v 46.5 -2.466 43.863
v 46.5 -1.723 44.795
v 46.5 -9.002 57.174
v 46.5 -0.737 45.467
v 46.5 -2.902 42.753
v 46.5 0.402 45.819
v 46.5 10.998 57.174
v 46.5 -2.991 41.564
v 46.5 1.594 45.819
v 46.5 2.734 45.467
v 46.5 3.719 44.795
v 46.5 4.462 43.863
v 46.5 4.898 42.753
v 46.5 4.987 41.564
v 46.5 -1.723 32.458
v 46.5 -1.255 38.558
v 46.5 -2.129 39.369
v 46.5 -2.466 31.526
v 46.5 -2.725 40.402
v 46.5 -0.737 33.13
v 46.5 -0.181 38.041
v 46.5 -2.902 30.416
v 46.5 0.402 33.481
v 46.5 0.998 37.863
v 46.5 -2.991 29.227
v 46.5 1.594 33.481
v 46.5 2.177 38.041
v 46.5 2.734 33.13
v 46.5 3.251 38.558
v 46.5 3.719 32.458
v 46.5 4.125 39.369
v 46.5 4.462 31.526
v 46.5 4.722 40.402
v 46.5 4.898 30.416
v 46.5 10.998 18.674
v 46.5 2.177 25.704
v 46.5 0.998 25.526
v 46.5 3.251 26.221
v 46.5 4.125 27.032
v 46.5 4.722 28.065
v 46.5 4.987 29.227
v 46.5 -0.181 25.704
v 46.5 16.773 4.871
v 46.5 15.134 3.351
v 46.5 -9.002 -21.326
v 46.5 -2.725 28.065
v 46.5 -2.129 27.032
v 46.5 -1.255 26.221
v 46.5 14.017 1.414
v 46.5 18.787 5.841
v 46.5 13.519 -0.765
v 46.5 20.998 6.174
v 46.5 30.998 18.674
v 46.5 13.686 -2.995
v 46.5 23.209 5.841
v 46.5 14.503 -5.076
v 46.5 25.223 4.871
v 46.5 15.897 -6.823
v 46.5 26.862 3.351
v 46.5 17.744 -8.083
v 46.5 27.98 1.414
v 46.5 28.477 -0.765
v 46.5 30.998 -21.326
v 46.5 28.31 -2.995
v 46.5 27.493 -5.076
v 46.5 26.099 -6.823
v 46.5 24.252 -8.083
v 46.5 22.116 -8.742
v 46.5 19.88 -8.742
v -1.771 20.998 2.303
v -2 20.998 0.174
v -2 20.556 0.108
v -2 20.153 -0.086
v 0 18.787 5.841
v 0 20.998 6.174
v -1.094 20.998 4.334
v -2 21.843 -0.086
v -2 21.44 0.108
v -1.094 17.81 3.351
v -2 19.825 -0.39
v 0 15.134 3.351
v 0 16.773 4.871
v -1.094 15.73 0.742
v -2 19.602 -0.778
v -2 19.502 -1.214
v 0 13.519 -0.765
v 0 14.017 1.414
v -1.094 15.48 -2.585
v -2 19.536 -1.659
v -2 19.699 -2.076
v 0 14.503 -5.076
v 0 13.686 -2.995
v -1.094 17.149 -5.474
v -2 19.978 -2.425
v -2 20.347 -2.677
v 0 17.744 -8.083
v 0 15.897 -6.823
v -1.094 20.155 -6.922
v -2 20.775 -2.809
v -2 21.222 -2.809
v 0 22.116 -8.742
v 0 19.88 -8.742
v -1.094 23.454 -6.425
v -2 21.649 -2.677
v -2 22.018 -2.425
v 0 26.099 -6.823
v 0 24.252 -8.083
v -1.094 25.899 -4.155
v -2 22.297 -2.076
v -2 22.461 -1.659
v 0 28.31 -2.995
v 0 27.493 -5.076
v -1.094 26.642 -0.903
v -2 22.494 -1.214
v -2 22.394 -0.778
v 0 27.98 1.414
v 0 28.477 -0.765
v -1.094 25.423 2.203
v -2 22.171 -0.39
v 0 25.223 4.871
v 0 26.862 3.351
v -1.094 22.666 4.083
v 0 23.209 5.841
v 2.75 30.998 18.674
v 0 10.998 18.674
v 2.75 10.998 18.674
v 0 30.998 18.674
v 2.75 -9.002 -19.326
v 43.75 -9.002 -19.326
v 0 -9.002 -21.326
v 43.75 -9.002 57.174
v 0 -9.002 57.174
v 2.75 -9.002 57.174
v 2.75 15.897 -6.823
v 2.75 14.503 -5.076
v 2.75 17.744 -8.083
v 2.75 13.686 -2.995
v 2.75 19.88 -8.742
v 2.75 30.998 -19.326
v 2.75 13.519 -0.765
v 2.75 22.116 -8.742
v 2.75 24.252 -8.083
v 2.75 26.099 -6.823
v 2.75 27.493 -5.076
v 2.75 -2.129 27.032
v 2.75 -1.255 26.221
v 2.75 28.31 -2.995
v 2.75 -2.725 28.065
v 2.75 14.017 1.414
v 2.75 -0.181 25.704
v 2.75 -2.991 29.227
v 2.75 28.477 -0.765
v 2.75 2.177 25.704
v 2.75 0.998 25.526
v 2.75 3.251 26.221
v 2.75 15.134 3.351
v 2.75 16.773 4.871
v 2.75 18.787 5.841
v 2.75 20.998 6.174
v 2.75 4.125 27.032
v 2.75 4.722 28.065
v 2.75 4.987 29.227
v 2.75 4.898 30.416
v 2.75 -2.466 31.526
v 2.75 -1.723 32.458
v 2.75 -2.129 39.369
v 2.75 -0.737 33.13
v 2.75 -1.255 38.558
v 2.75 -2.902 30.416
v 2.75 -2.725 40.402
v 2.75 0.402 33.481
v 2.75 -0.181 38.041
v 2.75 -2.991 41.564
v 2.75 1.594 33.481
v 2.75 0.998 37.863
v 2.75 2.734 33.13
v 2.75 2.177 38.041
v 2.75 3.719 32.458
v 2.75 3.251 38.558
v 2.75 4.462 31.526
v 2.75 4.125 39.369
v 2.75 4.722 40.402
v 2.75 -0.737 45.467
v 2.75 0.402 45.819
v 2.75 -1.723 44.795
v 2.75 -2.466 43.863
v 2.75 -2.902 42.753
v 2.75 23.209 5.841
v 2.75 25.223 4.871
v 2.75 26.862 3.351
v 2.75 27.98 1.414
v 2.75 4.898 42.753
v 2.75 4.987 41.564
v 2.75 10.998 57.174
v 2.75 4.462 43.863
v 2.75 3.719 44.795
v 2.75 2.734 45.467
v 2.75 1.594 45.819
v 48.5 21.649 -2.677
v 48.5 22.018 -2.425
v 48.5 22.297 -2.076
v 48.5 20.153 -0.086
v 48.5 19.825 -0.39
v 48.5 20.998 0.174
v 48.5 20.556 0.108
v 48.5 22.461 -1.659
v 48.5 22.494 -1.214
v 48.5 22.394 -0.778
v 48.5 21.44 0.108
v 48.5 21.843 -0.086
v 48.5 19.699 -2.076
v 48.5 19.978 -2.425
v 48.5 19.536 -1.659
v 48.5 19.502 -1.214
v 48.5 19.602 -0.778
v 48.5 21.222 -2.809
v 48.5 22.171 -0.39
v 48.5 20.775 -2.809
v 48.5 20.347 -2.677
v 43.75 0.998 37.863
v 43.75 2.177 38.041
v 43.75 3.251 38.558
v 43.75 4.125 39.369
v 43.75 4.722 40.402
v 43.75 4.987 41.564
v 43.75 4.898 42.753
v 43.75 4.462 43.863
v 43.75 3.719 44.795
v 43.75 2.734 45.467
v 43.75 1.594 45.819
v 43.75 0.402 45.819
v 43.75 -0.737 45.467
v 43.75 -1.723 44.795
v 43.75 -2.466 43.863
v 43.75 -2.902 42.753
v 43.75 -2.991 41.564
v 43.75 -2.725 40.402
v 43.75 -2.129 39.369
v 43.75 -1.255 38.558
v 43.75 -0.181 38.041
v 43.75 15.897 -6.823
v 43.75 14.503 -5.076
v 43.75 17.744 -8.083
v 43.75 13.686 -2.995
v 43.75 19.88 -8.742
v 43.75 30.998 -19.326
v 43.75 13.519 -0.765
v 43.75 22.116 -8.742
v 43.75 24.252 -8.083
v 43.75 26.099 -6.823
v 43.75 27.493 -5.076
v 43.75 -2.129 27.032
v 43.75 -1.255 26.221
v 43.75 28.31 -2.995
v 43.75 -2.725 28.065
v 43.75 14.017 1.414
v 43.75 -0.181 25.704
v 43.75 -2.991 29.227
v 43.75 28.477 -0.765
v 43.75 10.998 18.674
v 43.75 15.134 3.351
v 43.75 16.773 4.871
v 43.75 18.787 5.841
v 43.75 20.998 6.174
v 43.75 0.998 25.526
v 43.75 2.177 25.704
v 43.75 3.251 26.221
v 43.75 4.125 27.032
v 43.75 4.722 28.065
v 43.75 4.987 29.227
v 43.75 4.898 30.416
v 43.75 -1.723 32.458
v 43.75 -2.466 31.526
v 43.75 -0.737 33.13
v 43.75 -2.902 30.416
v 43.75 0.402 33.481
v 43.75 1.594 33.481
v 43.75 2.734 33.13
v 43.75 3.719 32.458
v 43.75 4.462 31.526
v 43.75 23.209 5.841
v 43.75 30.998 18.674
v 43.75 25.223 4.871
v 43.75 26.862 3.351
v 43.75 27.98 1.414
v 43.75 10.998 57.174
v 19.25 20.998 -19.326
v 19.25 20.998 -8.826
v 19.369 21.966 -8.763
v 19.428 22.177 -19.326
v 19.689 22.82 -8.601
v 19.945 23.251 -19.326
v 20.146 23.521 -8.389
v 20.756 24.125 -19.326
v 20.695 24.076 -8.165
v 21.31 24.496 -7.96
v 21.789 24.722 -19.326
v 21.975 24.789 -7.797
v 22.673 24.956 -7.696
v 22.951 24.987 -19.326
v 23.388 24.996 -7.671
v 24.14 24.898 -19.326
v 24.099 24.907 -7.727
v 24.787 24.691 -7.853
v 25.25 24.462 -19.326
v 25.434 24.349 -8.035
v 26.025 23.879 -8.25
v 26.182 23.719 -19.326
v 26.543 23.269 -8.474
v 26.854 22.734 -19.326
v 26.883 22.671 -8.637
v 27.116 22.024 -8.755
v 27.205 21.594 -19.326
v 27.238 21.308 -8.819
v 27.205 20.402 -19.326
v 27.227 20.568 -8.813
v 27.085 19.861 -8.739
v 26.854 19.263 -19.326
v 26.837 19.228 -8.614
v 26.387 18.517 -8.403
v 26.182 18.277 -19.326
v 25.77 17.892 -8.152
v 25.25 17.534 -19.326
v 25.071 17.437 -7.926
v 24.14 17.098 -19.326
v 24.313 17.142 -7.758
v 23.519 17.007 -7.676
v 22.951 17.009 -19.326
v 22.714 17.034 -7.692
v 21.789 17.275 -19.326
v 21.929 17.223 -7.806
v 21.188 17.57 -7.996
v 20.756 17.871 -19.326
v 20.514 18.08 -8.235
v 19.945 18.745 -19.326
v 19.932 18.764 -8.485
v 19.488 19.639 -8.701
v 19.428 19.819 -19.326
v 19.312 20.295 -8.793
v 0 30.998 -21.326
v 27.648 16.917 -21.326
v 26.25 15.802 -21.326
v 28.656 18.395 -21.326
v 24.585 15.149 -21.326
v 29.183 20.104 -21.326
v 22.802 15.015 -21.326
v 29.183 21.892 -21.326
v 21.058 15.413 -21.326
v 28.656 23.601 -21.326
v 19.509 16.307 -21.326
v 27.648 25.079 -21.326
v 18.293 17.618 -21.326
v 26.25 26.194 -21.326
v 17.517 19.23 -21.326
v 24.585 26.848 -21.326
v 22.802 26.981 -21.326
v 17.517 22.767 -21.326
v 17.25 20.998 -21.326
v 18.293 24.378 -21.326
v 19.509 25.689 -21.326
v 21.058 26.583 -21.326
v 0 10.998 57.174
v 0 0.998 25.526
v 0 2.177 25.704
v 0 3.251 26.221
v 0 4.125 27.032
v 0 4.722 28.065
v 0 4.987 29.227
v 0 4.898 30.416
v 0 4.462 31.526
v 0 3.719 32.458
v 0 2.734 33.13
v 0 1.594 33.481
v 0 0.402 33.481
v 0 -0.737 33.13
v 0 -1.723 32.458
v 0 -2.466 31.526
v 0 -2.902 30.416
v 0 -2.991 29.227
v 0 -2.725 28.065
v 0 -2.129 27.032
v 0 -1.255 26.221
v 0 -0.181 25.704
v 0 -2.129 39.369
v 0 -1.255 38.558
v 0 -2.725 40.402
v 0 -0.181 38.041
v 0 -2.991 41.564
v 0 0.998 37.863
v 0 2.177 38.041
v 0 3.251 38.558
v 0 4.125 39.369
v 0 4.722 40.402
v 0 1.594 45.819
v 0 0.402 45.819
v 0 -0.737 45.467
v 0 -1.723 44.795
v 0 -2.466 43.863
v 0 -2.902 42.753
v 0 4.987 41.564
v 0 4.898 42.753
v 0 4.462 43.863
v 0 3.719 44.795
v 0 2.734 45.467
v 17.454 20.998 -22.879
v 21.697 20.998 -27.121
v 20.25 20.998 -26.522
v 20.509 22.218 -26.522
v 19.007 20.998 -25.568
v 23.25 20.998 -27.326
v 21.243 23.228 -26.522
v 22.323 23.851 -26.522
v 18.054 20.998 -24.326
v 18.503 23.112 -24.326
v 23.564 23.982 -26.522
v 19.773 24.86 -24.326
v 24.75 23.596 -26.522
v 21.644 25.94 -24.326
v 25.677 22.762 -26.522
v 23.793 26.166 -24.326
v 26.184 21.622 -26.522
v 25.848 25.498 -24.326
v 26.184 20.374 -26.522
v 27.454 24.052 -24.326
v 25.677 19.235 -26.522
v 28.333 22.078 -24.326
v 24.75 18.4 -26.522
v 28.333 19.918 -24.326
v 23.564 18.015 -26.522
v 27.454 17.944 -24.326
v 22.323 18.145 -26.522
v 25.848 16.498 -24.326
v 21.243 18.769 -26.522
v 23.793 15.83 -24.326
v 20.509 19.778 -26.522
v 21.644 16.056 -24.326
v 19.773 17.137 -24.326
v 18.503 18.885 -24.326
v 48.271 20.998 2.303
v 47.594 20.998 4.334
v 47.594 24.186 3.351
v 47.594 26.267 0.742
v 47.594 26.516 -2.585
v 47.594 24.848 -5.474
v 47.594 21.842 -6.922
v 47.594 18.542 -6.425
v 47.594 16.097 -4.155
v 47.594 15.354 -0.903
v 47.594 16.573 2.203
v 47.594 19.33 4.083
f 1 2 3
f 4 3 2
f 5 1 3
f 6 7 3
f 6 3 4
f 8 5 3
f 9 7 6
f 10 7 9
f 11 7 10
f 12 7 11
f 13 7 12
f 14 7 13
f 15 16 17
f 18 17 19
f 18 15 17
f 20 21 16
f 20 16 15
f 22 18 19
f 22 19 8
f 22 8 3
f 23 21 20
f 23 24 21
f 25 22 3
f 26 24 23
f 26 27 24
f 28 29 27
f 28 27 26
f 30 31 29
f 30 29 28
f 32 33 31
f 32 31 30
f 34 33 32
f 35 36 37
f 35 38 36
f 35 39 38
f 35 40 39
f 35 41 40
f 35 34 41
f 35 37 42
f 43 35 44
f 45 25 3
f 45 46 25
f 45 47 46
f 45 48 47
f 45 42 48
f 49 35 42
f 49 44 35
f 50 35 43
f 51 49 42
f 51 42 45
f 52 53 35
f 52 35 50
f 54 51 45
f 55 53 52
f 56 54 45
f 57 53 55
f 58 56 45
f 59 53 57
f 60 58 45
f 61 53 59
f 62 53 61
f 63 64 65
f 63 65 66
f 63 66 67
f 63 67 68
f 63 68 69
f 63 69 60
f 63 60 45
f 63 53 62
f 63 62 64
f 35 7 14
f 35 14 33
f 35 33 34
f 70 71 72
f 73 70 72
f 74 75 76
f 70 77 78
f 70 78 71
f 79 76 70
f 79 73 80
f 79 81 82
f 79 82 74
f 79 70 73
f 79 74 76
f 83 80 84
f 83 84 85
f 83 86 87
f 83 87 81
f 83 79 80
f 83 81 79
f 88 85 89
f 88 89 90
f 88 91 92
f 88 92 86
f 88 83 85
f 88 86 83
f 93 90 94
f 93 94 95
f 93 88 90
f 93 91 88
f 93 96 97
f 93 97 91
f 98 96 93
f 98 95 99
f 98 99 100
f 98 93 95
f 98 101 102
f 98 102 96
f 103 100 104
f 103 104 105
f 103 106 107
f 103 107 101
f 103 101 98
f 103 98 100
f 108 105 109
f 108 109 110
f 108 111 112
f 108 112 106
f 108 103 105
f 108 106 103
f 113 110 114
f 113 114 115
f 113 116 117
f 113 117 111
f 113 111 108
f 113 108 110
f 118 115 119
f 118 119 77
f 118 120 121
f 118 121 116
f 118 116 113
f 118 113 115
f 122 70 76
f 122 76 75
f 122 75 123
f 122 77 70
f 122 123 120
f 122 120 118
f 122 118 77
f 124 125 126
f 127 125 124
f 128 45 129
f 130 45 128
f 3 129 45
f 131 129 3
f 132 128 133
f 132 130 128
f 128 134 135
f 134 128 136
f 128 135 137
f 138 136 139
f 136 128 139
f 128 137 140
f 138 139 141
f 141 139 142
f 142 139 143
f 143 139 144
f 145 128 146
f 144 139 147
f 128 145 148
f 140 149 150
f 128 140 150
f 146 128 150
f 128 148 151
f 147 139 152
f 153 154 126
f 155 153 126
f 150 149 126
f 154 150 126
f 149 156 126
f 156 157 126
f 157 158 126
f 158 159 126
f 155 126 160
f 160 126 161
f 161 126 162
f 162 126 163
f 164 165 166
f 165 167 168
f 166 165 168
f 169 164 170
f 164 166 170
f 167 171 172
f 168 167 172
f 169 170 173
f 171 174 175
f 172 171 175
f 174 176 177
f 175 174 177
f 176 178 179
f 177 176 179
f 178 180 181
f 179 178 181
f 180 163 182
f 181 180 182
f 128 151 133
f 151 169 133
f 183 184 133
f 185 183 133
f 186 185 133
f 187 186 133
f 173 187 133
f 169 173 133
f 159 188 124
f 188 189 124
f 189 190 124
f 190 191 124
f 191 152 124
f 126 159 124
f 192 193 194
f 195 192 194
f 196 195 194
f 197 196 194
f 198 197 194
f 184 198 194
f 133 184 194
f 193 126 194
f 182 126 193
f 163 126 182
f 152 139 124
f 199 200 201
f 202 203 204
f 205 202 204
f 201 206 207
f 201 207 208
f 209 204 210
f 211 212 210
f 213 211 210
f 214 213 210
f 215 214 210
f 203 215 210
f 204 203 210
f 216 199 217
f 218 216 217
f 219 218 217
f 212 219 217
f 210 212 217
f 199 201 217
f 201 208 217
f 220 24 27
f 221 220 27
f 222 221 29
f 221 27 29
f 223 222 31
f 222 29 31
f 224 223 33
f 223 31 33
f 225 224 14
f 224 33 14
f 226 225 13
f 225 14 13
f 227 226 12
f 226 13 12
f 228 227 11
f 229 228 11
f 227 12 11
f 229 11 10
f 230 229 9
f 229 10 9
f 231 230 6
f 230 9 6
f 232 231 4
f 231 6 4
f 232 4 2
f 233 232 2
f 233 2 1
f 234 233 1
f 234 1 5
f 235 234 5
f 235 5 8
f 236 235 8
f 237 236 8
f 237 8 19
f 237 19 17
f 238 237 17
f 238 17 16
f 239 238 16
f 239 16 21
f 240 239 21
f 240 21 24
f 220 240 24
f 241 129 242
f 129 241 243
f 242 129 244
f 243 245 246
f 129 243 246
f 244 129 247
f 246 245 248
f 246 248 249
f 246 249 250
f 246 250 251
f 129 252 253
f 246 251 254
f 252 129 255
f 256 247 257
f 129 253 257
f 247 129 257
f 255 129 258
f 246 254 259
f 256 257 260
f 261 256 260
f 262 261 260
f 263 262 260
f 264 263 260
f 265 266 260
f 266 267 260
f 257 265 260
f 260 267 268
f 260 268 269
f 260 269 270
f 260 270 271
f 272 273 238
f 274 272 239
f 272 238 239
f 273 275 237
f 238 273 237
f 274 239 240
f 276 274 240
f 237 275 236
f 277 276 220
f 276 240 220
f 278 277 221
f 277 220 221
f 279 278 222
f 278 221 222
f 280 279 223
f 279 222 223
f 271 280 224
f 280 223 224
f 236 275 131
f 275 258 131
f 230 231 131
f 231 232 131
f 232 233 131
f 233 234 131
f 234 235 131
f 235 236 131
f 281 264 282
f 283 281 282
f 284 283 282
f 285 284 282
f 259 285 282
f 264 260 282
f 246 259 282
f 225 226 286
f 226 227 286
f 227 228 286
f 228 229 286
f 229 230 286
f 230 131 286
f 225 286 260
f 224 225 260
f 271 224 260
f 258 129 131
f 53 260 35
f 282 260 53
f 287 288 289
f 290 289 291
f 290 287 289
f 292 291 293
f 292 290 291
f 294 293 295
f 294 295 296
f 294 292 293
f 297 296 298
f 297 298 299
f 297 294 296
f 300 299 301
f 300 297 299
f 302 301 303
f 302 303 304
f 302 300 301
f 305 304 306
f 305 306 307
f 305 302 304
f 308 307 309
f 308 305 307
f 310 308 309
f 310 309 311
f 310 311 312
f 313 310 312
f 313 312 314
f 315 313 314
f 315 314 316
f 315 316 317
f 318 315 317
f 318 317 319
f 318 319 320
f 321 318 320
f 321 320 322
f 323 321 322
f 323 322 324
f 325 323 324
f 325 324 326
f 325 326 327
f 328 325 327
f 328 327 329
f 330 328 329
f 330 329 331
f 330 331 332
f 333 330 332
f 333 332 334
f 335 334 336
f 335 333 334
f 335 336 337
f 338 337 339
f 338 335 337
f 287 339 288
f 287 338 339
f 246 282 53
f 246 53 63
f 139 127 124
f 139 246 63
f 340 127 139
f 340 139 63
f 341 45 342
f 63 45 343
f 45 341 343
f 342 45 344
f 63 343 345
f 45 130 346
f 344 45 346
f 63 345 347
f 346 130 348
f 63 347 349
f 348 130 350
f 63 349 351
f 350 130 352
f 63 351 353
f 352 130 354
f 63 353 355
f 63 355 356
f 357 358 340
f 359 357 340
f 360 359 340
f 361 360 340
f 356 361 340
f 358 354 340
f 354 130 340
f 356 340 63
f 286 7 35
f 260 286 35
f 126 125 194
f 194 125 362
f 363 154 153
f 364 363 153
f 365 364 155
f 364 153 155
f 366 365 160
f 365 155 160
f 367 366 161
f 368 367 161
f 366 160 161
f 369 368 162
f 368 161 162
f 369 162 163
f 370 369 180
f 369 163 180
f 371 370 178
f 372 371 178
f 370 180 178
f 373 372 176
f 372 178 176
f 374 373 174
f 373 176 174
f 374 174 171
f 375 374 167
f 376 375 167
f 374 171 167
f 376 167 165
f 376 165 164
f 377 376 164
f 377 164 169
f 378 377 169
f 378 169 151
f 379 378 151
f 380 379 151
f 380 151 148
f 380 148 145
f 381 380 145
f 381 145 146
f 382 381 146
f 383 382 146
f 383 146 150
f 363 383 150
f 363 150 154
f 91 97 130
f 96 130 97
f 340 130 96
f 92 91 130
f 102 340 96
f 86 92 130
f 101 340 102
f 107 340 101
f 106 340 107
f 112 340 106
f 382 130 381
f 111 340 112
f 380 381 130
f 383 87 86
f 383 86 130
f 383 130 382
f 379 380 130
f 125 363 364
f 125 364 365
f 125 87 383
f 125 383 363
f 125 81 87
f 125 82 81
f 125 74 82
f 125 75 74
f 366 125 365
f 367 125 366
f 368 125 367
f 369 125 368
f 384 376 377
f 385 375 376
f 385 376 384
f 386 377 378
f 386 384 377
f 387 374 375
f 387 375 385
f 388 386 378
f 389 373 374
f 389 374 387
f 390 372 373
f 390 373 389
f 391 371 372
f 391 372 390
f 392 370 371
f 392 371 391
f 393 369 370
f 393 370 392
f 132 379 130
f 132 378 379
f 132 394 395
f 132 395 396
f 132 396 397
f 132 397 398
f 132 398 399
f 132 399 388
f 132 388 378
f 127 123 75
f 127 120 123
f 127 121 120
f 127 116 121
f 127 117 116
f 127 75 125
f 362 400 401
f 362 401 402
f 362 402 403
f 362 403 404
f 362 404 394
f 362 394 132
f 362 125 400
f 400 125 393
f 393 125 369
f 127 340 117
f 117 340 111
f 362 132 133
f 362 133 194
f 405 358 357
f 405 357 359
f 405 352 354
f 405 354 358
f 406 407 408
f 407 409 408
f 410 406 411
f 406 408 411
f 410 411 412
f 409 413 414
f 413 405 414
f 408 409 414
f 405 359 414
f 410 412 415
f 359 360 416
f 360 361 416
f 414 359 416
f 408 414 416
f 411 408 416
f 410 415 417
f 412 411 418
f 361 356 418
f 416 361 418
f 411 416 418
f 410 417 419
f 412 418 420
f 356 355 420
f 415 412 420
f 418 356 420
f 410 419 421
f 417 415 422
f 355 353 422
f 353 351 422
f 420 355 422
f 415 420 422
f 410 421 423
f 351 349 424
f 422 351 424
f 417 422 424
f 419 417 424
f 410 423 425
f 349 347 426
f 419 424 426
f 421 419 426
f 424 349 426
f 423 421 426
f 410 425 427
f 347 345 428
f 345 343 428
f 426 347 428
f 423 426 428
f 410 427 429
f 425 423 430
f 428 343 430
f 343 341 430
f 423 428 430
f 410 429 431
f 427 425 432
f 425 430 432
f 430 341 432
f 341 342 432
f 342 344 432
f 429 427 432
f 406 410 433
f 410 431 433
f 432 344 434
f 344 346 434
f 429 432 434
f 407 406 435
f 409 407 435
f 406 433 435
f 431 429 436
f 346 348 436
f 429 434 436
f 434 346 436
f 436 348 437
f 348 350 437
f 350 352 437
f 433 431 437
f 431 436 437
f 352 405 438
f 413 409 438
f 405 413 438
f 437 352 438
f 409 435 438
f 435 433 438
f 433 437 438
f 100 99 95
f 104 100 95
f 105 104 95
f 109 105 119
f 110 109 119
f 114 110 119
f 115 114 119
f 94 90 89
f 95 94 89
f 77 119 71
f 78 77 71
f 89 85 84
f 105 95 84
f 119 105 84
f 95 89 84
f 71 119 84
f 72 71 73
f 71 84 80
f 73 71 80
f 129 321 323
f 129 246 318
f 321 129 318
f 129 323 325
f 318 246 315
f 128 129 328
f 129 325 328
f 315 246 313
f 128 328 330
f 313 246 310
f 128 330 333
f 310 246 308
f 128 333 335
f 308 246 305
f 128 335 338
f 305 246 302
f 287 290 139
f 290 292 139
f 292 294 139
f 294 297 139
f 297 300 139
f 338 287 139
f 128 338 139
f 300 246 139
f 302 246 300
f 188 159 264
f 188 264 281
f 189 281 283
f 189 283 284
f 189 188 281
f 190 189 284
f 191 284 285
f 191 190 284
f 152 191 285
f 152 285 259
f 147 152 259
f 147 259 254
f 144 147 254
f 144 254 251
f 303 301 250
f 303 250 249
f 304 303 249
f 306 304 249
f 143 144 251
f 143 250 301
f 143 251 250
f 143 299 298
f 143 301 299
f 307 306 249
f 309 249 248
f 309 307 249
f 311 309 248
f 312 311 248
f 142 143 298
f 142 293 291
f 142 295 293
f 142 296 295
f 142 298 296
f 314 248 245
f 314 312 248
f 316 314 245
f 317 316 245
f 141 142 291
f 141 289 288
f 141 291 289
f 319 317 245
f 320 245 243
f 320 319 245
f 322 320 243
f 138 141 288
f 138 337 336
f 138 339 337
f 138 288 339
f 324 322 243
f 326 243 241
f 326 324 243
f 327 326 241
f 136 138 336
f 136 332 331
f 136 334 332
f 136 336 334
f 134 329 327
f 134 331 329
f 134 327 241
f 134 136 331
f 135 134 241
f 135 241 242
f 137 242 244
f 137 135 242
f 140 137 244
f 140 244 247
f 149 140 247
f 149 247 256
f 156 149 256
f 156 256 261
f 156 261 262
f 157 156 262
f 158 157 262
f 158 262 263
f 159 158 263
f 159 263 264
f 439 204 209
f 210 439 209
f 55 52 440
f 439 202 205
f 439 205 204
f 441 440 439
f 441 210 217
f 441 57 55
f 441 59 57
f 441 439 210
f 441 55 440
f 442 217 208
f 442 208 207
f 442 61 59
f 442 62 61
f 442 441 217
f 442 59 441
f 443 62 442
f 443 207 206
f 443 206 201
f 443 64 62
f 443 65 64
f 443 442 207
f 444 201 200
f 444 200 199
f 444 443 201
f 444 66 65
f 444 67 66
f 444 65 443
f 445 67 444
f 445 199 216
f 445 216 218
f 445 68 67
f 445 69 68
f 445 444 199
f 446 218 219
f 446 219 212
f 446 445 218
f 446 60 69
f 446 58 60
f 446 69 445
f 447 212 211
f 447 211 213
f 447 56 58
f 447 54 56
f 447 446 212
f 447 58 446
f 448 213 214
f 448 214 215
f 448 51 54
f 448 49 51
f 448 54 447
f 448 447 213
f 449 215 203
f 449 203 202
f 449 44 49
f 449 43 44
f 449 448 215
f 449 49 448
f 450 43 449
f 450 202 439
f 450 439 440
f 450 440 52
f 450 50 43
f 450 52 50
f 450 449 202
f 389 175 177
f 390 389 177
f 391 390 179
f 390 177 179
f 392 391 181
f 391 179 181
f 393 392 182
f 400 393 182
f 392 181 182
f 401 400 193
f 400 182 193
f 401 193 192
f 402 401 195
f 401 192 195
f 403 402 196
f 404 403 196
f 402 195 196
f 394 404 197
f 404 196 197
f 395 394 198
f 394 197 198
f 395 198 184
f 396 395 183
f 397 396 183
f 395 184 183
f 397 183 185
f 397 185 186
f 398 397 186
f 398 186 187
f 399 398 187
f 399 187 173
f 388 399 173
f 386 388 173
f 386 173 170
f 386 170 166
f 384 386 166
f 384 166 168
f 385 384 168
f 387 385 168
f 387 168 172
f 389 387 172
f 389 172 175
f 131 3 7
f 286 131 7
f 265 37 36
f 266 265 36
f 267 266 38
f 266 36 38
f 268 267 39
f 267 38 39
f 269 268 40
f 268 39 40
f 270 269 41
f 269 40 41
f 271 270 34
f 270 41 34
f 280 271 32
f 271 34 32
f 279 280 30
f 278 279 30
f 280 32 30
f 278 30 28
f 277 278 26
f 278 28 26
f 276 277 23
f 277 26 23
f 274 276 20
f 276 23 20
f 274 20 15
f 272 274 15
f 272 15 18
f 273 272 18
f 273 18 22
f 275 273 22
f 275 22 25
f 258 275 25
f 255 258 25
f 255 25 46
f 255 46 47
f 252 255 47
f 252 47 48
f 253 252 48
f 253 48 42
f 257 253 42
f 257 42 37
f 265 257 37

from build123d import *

# Parameters (mm, degrees)
SKETCH_1_W          = 40
SKETCH_1_H          = 40
EXTRUDE_2_DEPTH     = 46.5
SKETCH_3_W          = 38.5
SKETCH_3_H          = 20
EXTRUDE_3_DEPTH     = 2.75
SKETCH_4_W          = 38.5
SKETCH_4_H          = 20
EXTRUDE_4_DEPTH     = 2.75
CUT_EXTRUDE_1_DEPTH = 38
SKETCH_6_R          = 7.5
EXTRUDE_5_DEPTH     = 48.5
EXTRUDE_START       = -50.5
SKETCH_7_R          = 7.5
EXTRUDE_6_DEPTH     = 50.5
FILLET_1_R          = 10
SKETCH_8_R          = 4
CUT_EXTRUDE_2_DEPTH = 50.5
SKETCH_9_R          = 6
EXTRUDE_7_DEPTH     = 6
SKETCH_10_R         = 4
EXTRUDE_9_DEPTH     = 20
FILLET_3_R          = 6


# Some blends are built 0.0001 mm under size
with BuildPart() as part:
    # 草图1 → 凸台-拉伸2 (new body)
    with BuildSketch(Plane(origin=(0, 0, 0), x_dir=(0, 0, -1), z_dir=(1, 0, 0))):
        with Locations((1.325599553, 10.998115505)):
            Rectangle(SKETCH_1_W, SKETCH_1_H)
    extrude(amount=EXTRUDE_2_DEPTH)

    # 草图3 → 凸台-拉伸3 (add)
    with BuildSketch(Plane(origin=(46.5, 0, 0), x_dir=(0, 0, -1), z_dir=(1, 0, 0))):
        with Locations((-37.924400447, 0.998115505)):
            Rectangle(SKETCH_3_W, SKETCH_3_H)
    extrude(amount=-EXTRUDE_3_DEPTH)

    # 草图4 → 凸台-拉伸4 (add)
    with BuildSketch(Plane.ZY):
        with Locations((37.924400447, 0.998115505)):
            Rectangle(SKETCH_4_W, SKETCH_4_H)
    extrude(amount=-EXTRUDE_4_DEPTH)

    # 草图5 → 切除-拉伸1 (cut)
    with BuildSketch(Plane.XY.offset(18.674400447)):
        Polygon((2.75, 10.998115505), (2.75, 30.998115505), (43.75, 30.998115505), (43.75, 10.998115505), (43.75, -9.001884495), (2.75, -9.001884495), align=None)
    extrude(amount=-CUT_EXTRUDE_1_DEPTH, mode=Mode.SUBTRACT)

    # 草图6 → 凸台-拉伸5 (add)
    with BuildSketch(Plane.ZY):
        with Locations((-1.325599553, 20.998115505)):
            Circle(SKETCH_6_R)
    extrude(amount=-EXTRUDE_5_DEPTH)

    # 草图7 → 凸台-拉伸6 (add)
    with BuildSketch(Plane(origin=(48.5, 0, 0), x_dir=(0, 0, -1), z_dir=(1, 0, 0)).offset(EXTRUDE_START)):
        with Locations(Location((1.325599553, 20.998115505, 0), (0, 0, 180))):
            Circle(SKETCH_7_R)
    extrude(amount=EXTRUDE_6_DEPTH)

    # 圆角1
    # the kernel refuses this fillet: 10 mm, written as the material it takes off along each edge
    with BuildSketch(Plane(origin=(48.5, 20.998115505, -1.325599553), x_dir=(0, 0, 1), z_dir=(0, -1, 0))) as fillet_1_piece_1:
        with BuildLine():
            CenterArc((1.5, 10), FILLET_1_R, 270, 36.869897646)
            Line((1.5, 0), (1.5, -0.2))
            Line((1.5, -0.2), (7.5, -0.2))
            Line((7.5, -0.2), (7.7, 0))
            ThreePointArc((7.7, 0), (7.7, 1), (7.62, 1.84))
            Line((7.62, 1.84), (7.5, 2))
        make_face()
    revolve(axis=Axis((48.5, 20.998115505, -1.325599553), (-1, 0, 0)), mode=Mode.SUBTRACT)
    with BuildSketch(Plane(origin=(-2, 20.998115505, -1.325599553), x_dir=(0, 0, 1), z_dir=(0, 1, 0))) as fillet_1_piece_2:
        with BuildLine():
            CenterArc((1.5, 10), FILLET_1_R, 270, 36.869897646)
            Line((1.5, 0), (1.5, -0.2))
            Line((1.5, -0.2), (7.5, -0.2))
            Line((7.5, -0.2), (7.7, 0))
            ThreePointArc((7.7, 0), (7.7, 1), (7.62, 1.84))
            Line((7.62, 1.84), (7.5, 2))
        make_face()
    revolve(axis=Axis((-2, 20.998115505, -1.325599553), (1, 0, 0)), mode=Mode.SUBTRACT)

    # 草图8 → 切除-拉伸2 (cut)
    with BuildSketch(Plane(origin=(46.5, 0, 0), x_dir=(0, 0, -1), z_dir=(1, 0, 0))):
        with Locations((-41.863292437, 0.998115505)):
            Circle(SKETCH_8_R)
        with Locations((-29.525991128, 0.998115505)):
            Circle(SKETCH_8_R)
    extrude(amount=-CUT_EXTRUDE_2_DEPTH, mode=Mode.SUBTRACT)

    # 草图9 → 凸台-拉伸7 (add)
    with BuildSketch(Plane(origin=(0, 0, -21.325599553), x_dir=(-1, 0, 0), z_dir=(0, 0, -1))):
        with Locations((-23.25, 20.998115505)):
            Circle(SKETCH_9_R)
    extrude(amount=EXTRUDE_7_DEPTH)

    # 草图10 → 凸台-拉伸9 (add)
    with BuildSketch(Plane(origin=(0, 0, -27.325599553), x_dir=(-1, 0, 0), z_dir=(0, 0, -1))):
        with Locations((-23.25, 20.998115505)):
            Circle(SKETCH_10_R)
    extrude(amount=-EXTRUDE_9_DEPTH)

    # 圆角3
    fillet_3_edges = [part.edges().sort_by_distance(p)[0] for p in [
        (29.25, 20.998115505, -27.325599553),
    ]]
    fillet(fillet_3_edges, radius=FILLET_3_R - 0.0001)  # a hair under: the kernel refuses the full size


solid = part.part
